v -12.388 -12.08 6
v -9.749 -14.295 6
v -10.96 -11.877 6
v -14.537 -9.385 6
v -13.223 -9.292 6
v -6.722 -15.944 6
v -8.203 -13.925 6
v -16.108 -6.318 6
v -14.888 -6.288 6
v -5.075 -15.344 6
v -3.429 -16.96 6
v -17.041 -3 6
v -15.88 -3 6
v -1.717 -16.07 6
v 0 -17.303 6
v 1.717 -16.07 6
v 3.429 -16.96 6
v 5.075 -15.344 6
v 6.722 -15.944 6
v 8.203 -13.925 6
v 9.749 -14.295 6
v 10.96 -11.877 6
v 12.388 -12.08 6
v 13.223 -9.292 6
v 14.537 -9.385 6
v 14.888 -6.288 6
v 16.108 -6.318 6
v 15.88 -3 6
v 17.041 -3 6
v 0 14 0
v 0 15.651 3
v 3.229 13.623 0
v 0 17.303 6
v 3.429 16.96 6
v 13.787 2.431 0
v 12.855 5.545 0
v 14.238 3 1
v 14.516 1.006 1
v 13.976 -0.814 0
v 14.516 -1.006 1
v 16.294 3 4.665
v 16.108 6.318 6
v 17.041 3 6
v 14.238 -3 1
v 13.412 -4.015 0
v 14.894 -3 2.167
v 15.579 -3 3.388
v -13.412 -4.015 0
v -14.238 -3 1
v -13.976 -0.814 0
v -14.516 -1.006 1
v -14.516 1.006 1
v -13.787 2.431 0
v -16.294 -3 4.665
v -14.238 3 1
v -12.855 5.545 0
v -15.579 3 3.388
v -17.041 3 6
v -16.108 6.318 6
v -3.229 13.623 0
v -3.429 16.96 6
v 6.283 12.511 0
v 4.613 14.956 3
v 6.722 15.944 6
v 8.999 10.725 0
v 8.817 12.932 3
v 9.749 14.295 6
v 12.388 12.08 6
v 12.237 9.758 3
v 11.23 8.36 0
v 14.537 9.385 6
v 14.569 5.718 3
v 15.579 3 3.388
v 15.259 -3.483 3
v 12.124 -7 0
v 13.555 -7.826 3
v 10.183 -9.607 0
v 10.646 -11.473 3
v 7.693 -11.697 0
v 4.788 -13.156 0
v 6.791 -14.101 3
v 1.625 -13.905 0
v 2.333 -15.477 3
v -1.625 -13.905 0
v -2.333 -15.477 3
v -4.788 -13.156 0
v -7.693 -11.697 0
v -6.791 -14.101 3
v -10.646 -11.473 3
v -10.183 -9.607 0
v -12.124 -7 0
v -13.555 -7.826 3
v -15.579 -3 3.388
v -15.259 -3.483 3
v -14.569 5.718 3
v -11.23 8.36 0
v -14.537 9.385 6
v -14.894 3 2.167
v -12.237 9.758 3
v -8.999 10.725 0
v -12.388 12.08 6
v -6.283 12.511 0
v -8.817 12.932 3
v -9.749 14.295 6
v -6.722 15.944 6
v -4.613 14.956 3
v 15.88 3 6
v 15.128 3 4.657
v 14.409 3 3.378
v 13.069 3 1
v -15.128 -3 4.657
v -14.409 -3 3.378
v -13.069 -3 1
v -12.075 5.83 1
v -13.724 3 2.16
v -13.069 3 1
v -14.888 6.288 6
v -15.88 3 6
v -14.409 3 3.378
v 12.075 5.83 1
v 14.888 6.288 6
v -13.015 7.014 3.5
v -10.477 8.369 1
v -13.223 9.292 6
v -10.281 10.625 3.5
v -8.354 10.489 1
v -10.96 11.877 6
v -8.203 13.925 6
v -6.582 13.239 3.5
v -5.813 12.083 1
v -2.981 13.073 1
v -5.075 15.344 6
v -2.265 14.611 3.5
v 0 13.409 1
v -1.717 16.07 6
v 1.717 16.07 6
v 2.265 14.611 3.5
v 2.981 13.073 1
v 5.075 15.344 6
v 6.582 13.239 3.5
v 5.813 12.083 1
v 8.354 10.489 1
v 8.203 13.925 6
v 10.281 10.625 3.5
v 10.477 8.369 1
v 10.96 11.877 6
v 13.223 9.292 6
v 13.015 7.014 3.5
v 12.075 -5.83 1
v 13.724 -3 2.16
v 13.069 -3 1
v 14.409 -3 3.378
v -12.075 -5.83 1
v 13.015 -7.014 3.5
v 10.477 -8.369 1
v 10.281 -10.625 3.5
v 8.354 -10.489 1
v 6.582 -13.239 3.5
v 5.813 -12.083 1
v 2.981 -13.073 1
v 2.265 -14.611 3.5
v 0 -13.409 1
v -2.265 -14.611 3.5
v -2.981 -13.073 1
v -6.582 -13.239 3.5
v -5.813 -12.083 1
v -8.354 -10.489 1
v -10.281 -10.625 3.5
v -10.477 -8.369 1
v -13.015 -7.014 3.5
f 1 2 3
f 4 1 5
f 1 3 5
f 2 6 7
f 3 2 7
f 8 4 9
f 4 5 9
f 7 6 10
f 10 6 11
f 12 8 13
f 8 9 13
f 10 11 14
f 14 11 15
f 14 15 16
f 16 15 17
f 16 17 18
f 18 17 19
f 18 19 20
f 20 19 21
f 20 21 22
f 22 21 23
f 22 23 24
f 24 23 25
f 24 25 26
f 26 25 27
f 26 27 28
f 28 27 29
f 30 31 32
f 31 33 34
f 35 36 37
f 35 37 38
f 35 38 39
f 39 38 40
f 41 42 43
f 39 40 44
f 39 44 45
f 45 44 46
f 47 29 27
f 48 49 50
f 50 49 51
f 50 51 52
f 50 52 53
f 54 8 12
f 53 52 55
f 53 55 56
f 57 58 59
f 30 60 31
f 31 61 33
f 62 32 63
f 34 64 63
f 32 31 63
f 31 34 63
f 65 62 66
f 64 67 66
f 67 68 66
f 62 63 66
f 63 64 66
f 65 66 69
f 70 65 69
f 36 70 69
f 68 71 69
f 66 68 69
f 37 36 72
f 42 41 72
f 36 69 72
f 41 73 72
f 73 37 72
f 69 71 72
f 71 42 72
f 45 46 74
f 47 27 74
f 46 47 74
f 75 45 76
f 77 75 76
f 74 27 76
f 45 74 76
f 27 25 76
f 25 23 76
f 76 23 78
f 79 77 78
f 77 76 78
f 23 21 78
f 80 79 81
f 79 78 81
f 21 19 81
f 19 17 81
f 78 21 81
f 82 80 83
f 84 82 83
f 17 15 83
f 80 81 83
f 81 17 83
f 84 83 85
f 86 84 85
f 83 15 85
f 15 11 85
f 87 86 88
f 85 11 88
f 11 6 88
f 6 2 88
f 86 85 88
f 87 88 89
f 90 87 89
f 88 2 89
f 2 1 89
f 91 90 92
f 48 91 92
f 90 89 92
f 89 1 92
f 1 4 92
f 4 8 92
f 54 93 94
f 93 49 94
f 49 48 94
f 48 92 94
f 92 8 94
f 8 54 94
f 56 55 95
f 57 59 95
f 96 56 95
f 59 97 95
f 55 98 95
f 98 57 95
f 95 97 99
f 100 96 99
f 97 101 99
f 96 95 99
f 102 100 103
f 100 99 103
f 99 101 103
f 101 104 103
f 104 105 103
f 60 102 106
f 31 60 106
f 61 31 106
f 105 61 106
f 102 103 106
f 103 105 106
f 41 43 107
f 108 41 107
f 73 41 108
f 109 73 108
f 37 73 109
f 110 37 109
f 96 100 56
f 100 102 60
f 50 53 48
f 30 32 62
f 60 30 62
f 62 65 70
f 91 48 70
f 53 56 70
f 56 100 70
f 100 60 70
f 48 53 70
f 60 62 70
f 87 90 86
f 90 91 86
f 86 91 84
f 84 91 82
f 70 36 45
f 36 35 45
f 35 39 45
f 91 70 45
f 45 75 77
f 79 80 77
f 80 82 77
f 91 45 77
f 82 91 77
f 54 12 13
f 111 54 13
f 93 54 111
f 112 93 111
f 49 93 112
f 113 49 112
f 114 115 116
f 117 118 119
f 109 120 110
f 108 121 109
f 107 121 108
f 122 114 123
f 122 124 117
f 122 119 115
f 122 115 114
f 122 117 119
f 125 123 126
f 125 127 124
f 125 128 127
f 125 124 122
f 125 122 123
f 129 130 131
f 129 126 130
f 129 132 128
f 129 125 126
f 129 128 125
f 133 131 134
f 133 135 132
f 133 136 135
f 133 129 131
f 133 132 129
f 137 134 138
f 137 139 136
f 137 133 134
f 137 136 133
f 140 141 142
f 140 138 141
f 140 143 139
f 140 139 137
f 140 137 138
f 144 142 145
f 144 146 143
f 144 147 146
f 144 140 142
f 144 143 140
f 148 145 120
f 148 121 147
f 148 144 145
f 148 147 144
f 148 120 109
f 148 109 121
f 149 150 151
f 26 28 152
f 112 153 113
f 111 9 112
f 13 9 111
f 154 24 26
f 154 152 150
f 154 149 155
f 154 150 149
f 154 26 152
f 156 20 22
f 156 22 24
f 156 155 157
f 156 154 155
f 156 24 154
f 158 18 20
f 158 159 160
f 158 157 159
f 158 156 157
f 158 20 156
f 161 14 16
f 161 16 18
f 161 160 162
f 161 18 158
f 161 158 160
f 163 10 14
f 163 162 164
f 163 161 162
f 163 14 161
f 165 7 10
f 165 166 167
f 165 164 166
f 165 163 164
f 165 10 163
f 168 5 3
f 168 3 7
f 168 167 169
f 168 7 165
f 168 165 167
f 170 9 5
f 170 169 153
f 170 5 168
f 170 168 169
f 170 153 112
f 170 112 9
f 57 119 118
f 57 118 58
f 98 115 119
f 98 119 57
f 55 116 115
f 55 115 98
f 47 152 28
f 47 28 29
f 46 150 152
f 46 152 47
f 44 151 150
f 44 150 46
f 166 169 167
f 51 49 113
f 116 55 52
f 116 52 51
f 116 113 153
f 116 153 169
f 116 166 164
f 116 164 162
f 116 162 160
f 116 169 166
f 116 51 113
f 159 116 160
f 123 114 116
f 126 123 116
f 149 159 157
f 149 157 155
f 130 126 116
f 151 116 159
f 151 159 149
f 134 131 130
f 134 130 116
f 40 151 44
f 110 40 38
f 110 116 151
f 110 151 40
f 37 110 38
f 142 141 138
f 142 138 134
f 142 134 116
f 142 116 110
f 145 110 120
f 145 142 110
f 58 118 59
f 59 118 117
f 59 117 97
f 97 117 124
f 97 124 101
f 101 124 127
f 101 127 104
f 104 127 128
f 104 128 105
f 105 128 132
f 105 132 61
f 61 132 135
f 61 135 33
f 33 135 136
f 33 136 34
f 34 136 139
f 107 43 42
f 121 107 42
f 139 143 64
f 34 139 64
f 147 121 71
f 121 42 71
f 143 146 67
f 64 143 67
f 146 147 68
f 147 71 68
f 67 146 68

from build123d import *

# Parameters (mm, degrees)
F2_T     = -1
F4_DEPTH = 5.001


with BuildPart() as f1:
    # F0 (on Right) → F1 (revolve)
    with BuildSketch(Plane.YZ):
        Polygon((0, 6), (0, 0), (14, 0), (17.3028167337, 6), align=None)
    revolve(axis=Axis((0, 0, 3), (0, 0, -1)))

    # F2
    f2_openings = [f1.faces().sort_by_distance(p)[0] for p in [
        (0, 0, 6),
    ]]
    offset(amount=F2_T, openings=f2_openings)

    # F3 (on face) → F4 (cut, through all)
    with BuildSketch(Plane.XY.offset(1)):
        with BuildLine():
            Line((13.0690676017, -3), (25, -3))
            Line((25, -3), (25, 3))
            Line((25, 3), (13.0690676017, 3))
            ThreePointArc((13.0690676017, 3), (13.3237248636, 1.50959721), (13.408971921, 0))
            ThreePointArc((13.408971921, 0), (13.3237248636, -1.50959721), (13.0690676017, -3))
        make_face()
        with BuildLine():
            Line((-25, -3), (-13.0690676017, -3))
            ThreePointArc((-13.0690676017, -3), (-13.408971921, 0), (-13.0690676017, 3))
            Line((-13.0690676017, 3), (-25, 3))
            Line((-25, 3), (-25, -3))
        make_face()
        with BuildLine():
            Line((-13.0690676017, -3), (13.0690676017, -3))
            ThreePointArc((13.0690676017, -3), (13.3237248636, -1.50959721), (13.408971921, 0))
            ThreePointArc((13.408971921, 0), (13.3237248636, 1.50959721), (13.0690676017, 3))
            Line((13.0690676017, 3), (-13.0690676017, 3))
            ThreePointArc((-13.0690676017, 3), (-13.408971921, 0), (-13.0690676017, -3))
        make_face()
    extrude(amount=F4_DEPTH, mode=Mode.SUBTRACT)


solid = f1.part
